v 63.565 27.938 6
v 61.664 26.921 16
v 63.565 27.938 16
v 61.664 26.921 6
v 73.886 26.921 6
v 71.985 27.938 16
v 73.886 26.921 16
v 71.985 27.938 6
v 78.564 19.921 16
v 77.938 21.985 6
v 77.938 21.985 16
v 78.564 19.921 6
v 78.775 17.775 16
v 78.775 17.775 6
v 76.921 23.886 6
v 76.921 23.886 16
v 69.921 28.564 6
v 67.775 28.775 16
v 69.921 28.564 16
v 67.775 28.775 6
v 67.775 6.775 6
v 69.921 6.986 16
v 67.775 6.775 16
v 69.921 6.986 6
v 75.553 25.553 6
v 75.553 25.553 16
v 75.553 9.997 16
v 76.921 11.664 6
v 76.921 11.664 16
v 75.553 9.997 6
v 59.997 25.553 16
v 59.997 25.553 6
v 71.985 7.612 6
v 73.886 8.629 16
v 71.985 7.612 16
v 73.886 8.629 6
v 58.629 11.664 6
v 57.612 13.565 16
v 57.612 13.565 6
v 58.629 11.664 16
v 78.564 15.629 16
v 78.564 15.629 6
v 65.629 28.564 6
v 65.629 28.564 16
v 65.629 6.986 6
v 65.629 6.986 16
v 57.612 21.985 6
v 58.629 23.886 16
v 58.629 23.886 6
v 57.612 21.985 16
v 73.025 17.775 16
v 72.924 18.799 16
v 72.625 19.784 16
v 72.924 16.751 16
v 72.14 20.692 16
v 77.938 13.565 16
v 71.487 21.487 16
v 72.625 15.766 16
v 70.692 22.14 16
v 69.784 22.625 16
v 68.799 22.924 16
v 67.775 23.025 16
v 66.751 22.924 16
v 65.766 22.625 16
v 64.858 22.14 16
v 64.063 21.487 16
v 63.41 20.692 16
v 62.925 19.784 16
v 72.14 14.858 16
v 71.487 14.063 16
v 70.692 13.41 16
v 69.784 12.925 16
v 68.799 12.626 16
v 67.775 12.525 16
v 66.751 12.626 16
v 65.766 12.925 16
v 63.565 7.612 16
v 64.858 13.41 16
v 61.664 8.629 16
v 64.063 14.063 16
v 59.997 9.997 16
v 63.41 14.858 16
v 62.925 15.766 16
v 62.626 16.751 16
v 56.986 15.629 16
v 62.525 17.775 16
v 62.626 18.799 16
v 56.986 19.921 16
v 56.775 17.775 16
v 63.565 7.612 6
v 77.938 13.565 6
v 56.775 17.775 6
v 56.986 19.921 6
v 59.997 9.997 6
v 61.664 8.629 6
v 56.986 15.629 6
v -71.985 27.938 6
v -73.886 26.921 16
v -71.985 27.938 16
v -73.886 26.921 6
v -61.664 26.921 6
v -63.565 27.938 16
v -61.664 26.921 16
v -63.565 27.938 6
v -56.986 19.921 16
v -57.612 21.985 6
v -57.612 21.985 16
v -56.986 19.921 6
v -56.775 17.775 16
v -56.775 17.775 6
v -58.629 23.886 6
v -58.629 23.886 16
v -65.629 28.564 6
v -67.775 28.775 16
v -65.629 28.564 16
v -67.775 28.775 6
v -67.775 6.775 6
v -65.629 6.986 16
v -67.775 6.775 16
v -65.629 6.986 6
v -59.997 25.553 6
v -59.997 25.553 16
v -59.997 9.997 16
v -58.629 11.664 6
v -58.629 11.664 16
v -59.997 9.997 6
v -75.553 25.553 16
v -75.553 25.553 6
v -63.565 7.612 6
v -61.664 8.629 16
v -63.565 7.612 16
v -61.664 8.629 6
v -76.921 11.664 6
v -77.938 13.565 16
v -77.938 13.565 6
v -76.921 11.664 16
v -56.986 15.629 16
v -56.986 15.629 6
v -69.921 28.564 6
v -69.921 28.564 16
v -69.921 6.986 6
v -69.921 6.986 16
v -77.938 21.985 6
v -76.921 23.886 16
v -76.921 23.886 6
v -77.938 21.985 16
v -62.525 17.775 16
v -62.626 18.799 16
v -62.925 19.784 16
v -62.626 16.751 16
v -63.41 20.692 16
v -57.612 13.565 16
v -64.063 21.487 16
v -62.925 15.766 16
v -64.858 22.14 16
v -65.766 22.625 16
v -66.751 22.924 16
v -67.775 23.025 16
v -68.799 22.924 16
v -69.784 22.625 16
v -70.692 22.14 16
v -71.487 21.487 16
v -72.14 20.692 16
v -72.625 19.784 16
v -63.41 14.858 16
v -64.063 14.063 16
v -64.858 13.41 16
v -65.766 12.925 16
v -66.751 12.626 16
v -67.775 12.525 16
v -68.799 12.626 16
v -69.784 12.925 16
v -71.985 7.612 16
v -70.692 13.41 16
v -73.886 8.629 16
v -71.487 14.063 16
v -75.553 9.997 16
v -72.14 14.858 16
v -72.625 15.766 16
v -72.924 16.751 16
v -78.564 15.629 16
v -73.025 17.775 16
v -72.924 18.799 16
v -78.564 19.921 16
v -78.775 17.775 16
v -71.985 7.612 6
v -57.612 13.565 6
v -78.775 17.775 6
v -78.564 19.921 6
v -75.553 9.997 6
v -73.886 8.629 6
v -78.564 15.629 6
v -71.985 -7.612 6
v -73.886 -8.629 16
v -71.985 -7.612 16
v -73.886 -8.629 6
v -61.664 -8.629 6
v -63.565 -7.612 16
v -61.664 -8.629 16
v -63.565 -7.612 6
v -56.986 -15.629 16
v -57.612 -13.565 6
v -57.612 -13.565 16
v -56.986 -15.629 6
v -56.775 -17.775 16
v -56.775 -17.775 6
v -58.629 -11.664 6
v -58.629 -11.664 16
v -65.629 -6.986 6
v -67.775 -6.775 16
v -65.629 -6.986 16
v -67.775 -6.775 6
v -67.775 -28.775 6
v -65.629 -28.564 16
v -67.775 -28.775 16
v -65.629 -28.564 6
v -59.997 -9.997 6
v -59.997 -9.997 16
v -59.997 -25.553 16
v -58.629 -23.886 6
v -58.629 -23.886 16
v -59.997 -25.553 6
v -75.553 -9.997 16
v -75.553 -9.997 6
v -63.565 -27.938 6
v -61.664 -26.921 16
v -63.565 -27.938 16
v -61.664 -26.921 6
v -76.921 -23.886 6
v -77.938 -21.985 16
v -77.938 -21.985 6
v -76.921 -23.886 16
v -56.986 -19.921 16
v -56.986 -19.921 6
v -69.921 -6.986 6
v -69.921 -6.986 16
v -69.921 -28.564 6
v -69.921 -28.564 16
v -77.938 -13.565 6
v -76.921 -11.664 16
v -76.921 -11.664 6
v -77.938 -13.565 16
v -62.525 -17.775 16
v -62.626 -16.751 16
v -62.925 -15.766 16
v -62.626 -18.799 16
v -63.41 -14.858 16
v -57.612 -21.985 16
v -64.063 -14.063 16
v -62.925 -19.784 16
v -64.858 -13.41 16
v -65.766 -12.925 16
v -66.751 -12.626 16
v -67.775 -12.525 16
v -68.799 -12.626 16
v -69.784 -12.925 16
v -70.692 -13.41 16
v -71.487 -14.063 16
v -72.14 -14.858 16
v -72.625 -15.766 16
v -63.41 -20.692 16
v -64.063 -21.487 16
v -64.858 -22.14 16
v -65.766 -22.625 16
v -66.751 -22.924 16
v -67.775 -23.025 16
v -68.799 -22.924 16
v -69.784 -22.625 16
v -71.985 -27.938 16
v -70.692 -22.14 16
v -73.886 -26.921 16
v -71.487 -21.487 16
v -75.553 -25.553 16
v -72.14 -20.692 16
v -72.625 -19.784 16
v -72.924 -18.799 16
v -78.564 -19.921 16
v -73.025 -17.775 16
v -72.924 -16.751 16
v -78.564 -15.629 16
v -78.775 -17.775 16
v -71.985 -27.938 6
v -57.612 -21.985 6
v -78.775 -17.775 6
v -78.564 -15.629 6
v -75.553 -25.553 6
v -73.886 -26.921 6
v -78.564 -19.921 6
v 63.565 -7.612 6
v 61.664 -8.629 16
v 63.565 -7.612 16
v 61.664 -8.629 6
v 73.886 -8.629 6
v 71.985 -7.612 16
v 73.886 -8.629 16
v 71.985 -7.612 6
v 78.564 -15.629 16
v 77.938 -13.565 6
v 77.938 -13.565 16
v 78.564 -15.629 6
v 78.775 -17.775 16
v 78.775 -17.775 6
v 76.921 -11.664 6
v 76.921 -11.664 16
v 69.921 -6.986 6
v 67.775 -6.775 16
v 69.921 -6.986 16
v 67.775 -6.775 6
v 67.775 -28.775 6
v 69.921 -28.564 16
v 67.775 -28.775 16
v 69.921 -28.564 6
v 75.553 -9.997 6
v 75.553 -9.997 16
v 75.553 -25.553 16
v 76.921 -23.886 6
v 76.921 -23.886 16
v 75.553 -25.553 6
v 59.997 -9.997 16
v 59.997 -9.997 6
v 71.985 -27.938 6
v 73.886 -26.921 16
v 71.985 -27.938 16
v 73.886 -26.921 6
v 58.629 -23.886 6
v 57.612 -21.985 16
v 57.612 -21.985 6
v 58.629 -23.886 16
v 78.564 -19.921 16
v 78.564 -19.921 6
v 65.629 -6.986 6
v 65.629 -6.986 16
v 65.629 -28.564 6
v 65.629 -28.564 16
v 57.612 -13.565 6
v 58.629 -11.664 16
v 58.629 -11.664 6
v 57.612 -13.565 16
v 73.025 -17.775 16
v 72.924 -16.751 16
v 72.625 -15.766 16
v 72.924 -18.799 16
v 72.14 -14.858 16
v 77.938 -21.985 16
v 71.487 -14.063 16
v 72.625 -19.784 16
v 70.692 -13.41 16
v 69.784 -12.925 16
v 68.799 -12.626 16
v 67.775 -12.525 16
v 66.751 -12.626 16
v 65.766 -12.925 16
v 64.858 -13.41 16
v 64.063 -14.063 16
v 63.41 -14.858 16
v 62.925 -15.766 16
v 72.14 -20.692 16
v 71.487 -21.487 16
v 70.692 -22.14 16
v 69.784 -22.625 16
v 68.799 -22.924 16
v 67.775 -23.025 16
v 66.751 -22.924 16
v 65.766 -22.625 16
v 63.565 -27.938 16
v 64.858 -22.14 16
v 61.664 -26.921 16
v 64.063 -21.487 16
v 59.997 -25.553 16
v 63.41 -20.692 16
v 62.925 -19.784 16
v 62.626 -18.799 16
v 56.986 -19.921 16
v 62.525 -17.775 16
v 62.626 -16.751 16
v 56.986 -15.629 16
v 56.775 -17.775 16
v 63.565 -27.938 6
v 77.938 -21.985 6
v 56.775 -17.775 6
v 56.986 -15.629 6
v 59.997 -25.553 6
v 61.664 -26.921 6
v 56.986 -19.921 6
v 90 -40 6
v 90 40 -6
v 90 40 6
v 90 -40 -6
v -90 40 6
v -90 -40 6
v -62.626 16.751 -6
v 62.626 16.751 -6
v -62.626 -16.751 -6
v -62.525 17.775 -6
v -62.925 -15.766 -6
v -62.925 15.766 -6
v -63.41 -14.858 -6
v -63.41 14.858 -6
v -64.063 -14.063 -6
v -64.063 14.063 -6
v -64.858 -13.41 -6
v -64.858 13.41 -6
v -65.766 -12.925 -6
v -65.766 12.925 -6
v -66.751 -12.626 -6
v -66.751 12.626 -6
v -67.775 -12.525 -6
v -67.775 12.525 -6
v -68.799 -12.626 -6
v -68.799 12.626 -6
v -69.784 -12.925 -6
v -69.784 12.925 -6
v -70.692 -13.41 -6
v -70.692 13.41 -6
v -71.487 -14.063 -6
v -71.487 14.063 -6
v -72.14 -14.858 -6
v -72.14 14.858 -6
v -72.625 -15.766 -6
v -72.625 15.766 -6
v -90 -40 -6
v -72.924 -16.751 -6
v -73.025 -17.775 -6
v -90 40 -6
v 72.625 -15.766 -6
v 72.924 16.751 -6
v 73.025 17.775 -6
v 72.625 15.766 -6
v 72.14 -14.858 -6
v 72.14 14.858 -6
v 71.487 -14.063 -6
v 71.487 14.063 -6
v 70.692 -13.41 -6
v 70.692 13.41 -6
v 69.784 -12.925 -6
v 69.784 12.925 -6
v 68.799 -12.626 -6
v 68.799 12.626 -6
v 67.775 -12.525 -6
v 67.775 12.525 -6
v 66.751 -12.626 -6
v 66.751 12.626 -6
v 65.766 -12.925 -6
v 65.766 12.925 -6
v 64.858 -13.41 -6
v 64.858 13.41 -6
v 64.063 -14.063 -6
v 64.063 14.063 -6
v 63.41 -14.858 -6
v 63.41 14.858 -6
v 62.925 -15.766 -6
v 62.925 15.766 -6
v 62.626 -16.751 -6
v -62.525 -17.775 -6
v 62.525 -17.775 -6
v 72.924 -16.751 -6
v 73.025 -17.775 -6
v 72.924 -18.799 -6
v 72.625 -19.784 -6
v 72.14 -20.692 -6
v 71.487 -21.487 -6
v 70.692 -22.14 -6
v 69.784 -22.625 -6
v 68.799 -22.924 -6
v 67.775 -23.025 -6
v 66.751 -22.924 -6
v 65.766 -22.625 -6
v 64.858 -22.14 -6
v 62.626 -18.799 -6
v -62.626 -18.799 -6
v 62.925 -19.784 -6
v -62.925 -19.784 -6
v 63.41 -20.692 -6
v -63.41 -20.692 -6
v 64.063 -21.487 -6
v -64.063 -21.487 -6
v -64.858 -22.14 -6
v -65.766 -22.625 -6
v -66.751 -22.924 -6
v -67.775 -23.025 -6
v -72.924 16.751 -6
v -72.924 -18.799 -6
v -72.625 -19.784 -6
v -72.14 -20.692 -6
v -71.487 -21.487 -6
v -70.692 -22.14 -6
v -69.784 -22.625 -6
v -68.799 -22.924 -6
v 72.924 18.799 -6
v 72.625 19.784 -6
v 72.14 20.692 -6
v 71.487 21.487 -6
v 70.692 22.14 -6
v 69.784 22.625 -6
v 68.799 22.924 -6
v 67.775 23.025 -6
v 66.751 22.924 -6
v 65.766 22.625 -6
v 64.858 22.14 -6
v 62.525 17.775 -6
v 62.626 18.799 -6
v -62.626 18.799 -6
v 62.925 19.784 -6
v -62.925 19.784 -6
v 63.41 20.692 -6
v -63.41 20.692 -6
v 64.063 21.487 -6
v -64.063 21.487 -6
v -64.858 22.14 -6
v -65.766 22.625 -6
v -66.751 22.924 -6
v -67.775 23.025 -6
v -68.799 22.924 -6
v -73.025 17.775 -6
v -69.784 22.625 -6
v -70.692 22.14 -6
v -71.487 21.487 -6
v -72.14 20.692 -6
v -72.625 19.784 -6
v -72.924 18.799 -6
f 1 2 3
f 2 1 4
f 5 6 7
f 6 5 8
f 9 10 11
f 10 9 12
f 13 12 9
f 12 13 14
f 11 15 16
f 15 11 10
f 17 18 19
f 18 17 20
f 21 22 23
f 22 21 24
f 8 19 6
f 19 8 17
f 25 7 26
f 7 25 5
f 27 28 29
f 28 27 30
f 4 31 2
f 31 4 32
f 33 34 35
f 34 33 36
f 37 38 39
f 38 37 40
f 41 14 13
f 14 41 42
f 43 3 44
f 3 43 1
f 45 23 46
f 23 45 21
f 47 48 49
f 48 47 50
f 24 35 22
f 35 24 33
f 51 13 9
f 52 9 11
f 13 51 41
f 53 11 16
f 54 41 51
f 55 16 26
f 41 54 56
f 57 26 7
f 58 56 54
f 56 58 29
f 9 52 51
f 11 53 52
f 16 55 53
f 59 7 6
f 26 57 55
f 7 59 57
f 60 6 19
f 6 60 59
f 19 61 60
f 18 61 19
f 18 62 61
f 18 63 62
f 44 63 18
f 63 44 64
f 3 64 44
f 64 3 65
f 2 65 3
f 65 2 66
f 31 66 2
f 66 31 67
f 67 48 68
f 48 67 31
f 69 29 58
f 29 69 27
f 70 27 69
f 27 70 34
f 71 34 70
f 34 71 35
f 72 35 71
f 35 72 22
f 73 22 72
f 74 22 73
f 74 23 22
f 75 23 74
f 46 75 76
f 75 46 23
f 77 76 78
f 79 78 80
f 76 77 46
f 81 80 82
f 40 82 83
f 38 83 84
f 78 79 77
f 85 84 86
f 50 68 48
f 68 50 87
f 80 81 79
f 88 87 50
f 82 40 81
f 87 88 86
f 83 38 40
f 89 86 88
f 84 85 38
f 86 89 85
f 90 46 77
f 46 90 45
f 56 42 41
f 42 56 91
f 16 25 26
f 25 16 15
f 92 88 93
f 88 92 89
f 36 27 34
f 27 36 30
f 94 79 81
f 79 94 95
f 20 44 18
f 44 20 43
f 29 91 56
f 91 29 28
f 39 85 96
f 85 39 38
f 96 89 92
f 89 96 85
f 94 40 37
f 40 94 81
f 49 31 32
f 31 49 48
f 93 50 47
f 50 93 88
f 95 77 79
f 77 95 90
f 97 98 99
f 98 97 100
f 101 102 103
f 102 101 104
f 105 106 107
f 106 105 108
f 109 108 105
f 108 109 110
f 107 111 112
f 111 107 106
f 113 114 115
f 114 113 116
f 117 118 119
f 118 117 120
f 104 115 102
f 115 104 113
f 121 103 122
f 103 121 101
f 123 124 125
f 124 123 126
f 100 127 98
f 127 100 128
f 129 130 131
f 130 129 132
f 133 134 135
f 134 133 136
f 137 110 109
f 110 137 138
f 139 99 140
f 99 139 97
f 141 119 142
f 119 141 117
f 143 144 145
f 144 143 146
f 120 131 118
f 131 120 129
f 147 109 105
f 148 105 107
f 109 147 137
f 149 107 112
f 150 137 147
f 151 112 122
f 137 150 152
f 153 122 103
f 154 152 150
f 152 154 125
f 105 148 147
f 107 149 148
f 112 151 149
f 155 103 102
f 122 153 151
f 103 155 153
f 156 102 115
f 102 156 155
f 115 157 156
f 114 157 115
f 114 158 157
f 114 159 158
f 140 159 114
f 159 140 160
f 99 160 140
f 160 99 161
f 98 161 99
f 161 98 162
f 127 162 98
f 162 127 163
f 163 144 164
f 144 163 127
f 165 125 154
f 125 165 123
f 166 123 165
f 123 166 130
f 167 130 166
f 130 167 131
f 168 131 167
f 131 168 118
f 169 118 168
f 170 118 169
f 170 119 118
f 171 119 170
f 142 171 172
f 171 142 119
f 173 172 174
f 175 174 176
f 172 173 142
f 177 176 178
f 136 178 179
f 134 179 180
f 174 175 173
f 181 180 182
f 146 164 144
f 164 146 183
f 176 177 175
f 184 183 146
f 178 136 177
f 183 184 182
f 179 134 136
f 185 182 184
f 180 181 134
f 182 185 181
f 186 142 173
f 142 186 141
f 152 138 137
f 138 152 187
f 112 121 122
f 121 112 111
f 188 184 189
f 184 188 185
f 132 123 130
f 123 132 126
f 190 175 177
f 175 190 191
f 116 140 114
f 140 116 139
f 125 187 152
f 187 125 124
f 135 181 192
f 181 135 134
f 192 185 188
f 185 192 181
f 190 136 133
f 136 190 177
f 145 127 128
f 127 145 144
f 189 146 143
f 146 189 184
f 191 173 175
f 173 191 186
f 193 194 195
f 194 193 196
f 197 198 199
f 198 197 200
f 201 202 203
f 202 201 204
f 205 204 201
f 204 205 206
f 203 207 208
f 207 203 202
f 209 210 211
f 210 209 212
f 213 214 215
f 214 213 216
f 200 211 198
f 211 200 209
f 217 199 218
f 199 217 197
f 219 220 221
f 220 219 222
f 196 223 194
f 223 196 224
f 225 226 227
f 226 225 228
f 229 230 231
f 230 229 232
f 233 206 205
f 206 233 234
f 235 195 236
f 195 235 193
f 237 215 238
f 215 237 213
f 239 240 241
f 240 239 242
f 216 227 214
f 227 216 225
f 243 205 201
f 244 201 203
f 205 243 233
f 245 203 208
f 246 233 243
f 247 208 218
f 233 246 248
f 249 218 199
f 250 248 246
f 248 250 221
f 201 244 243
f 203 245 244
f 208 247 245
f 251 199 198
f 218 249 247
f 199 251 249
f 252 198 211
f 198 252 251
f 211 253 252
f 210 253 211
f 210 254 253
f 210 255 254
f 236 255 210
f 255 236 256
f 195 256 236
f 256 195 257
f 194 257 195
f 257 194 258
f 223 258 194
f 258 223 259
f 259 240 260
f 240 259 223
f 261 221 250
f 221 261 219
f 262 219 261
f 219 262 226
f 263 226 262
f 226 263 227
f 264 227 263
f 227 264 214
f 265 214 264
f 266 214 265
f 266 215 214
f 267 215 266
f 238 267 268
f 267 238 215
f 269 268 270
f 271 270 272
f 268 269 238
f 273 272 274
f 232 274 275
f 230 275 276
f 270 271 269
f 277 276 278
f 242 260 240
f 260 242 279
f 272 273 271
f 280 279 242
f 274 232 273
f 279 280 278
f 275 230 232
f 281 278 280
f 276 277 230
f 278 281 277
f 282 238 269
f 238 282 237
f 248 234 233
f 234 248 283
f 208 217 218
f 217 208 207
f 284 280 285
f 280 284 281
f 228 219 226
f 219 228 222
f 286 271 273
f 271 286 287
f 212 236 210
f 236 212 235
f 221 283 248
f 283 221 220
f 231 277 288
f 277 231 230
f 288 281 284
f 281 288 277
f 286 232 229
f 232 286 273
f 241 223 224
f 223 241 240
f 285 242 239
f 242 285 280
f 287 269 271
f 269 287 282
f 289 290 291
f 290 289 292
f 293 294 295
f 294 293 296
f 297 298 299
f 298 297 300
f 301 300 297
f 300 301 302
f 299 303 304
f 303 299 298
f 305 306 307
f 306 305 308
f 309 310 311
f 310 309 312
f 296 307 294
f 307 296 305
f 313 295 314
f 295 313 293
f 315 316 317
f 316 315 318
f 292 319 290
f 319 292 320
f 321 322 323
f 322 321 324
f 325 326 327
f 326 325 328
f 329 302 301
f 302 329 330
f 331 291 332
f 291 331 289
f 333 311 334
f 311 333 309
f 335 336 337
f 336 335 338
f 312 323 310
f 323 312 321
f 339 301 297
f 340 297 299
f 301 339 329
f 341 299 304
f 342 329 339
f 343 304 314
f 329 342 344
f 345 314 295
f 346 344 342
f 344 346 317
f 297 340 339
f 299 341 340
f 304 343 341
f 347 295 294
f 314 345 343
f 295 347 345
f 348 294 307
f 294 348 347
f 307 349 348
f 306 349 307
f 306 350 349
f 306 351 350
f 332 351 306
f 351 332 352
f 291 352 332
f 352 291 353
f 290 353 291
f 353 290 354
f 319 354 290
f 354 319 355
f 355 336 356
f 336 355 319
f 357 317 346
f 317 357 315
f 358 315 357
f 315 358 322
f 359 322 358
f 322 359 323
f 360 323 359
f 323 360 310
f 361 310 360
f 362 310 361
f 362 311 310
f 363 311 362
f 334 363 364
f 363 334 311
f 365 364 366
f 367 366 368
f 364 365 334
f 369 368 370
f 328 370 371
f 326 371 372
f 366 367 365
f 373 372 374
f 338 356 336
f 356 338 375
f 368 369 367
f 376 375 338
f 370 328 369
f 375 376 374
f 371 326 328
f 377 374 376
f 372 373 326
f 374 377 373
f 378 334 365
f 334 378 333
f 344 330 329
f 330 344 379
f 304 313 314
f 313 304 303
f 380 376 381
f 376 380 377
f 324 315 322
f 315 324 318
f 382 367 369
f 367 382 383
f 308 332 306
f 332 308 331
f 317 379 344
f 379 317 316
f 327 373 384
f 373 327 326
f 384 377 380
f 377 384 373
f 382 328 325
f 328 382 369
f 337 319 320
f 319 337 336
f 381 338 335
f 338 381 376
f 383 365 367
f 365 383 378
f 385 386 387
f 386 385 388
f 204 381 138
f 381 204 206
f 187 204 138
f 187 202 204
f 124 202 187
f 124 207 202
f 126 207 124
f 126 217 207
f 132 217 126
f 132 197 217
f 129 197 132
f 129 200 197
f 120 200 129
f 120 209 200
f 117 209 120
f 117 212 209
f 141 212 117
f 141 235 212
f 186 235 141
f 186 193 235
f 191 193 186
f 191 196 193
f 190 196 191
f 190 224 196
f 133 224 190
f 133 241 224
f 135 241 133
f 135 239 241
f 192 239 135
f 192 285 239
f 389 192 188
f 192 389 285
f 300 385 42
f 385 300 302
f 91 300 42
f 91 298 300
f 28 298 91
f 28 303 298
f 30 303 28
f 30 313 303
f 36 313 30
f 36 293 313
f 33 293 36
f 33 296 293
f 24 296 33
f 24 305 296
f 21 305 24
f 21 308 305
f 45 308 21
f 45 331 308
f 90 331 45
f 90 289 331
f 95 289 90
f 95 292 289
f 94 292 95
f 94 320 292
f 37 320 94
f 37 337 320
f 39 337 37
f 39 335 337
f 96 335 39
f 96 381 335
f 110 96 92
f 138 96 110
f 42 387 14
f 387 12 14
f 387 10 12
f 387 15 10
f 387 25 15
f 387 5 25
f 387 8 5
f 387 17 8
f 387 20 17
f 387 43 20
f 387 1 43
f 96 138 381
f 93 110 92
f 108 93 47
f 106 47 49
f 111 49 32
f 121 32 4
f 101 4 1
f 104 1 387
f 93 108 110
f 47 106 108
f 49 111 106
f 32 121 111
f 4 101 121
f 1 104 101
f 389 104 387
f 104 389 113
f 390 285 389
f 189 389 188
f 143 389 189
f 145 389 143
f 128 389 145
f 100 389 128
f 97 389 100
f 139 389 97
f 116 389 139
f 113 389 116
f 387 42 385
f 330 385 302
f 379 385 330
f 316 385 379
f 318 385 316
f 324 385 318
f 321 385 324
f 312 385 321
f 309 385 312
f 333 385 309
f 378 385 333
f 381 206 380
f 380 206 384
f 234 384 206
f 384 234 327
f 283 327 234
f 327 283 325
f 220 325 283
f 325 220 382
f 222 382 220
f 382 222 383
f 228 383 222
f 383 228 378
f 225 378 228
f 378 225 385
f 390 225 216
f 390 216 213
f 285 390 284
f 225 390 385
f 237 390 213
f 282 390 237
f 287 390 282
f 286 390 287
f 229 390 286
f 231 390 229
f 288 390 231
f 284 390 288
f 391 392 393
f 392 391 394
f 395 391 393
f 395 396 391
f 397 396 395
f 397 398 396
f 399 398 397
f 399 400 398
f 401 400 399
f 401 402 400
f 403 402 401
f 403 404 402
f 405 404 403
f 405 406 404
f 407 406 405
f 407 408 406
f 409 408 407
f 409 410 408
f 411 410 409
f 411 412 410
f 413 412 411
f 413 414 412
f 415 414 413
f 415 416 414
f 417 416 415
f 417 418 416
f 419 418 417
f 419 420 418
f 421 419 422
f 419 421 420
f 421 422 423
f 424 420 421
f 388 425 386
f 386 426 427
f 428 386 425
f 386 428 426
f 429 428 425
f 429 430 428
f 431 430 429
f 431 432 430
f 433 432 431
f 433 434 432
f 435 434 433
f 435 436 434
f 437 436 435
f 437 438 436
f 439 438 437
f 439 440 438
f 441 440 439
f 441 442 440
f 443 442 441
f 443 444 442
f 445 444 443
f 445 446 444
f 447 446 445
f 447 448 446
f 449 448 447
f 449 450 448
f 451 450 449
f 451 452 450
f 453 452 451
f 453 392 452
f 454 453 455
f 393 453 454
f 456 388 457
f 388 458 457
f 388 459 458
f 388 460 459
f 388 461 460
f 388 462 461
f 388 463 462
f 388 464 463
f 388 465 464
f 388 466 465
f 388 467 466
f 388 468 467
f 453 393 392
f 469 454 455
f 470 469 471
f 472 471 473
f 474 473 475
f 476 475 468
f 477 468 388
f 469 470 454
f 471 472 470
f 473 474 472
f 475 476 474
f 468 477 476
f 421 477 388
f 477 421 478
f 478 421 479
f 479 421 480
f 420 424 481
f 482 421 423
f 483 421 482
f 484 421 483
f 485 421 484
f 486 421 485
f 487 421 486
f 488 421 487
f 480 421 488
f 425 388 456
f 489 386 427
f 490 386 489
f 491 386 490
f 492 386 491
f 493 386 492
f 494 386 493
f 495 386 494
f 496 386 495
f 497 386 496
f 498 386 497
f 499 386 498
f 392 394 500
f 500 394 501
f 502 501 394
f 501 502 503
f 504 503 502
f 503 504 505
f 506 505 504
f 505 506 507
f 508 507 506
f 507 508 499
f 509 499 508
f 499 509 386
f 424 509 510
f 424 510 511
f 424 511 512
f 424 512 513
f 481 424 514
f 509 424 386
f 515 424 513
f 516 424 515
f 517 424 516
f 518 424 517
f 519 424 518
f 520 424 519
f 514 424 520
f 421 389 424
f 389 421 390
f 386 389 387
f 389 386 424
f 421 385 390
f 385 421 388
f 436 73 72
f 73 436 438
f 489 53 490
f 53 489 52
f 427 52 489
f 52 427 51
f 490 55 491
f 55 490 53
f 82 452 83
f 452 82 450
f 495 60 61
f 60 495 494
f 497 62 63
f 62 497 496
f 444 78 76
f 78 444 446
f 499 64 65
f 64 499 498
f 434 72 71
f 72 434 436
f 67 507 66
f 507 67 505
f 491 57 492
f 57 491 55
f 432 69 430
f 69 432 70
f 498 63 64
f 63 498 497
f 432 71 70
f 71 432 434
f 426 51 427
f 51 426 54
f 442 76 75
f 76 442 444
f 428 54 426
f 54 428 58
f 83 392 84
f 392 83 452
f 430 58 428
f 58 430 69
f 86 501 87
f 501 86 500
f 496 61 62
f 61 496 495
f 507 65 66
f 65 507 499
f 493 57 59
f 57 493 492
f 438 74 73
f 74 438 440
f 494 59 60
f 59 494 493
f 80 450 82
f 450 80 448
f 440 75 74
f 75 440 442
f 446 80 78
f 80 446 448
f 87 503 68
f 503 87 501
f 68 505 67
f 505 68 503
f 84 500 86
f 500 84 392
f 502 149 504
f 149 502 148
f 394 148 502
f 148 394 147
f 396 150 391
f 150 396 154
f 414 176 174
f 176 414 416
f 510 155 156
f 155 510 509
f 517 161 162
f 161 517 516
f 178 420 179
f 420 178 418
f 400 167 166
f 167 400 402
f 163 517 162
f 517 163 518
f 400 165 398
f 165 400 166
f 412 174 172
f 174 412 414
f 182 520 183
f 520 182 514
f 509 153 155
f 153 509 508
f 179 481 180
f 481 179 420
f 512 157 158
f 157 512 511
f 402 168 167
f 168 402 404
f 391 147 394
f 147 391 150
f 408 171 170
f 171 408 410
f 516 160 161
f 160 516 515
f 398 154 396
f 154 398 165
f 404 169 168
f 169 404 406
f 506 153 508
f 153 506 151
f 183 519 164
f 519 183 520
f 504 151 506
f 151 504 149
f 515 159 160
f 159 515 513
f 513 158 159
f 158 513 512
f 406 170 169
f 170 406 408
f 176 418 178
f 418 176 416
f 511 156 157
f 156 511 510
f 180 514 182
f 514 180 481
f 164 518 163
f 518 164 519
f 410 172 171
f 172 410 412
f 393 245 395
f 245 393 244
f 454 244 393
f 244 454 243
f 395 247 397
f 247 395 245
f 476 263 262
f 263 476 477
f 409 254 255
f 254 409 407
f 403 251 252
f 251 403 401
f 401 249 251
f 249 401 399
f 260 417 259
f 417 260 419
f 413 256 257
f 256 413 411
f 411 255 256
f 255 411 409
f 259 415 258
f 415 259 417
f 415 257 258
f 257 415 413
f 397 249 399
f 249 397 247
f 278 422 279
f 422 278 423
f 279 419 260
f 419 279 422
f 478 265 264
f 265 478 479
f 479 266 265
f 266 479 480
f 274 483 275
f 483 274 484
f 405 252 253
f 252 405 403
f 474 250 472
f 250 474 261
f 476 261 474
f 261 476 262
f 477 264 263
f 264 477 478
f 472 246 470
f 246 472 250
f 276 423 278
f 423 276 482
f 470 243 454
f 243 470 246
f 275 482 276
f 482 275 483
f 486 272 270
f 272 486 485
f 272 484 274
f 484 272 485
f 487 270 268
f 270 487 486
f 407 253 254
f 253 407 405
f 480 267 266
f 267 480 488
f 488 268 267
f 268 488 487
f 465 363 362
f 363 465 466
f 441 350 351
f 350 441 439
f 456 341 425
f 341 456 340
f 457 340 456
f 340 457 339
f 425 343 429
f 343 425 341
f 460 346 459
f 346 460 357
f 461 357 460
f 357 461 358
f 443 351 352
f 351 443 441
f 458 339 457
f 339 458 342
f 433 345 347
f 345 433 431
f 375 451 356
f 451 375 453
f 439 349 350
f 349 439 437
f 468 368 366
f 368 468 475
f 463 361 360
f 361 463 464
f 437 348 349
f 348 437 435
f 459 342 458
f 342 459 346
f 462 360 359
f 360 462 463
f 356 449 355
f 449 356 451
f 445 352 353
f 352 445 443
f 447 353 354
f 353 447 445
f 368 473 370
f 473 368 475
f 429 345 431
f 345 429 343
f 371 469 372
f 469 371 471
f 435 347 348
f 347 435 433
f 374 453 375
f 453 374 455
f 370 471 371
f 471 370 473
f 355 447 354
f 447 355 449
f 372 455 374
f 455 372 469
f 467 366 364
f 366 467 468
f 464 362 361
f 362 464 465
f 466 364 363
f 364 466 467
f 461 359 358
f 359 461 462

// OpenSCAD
$fn = 32;

// ----------------------------------------------------------------------
// Anchor pads 180 x 80 x 22
// four corner bosses with anchor holes
// ----------------------------------------------------------------------

// --- parameters (mm) ---
plate = [180, 80, 12];  // base plate size (x, y, z)
pads = 4;               // boss count, one per corner
edge = 22.225;          // boss centre offset from the plate edge
boss_d = 22;            // boss diameter
boss_h = 10;            // boss height above the base plate
hole_d = 10.5;          // hole diameter

// --- derived feature positions (mm) ---
height = plate[2] + boss_h;      // = 22   overall height of the part
corner_x = plate[0] / 2 - edge;  // = 67.78   boss centre X
corner_y = plate[1] / 2 - edge;  // = 17.77   boss centre Y
feature_centers = [
  [corner_x, corner_y],
  [-corner_x, corner_y],
  [-corner_x, -corner_y],
  [corner_x, -corner_y]
];   // boss centres, anchor holes are drilled there

// base plate, four bosses standing on it, anchor holes all the way through
difference() {
  union() {
    cube(plate, center = true);
    for (centre = feature_centers)
      translate([centre[0], centre[1], plate[2] / 2 - 1])
        cylinder(d = boss_d, h = boss_h + 1);
  }
  for (centre = feature_centers)
    translate([centre[0], centre[1], -height])
      cylinder(d = hole_d, h = 2 * height + 2);  // through boss and plate
}
